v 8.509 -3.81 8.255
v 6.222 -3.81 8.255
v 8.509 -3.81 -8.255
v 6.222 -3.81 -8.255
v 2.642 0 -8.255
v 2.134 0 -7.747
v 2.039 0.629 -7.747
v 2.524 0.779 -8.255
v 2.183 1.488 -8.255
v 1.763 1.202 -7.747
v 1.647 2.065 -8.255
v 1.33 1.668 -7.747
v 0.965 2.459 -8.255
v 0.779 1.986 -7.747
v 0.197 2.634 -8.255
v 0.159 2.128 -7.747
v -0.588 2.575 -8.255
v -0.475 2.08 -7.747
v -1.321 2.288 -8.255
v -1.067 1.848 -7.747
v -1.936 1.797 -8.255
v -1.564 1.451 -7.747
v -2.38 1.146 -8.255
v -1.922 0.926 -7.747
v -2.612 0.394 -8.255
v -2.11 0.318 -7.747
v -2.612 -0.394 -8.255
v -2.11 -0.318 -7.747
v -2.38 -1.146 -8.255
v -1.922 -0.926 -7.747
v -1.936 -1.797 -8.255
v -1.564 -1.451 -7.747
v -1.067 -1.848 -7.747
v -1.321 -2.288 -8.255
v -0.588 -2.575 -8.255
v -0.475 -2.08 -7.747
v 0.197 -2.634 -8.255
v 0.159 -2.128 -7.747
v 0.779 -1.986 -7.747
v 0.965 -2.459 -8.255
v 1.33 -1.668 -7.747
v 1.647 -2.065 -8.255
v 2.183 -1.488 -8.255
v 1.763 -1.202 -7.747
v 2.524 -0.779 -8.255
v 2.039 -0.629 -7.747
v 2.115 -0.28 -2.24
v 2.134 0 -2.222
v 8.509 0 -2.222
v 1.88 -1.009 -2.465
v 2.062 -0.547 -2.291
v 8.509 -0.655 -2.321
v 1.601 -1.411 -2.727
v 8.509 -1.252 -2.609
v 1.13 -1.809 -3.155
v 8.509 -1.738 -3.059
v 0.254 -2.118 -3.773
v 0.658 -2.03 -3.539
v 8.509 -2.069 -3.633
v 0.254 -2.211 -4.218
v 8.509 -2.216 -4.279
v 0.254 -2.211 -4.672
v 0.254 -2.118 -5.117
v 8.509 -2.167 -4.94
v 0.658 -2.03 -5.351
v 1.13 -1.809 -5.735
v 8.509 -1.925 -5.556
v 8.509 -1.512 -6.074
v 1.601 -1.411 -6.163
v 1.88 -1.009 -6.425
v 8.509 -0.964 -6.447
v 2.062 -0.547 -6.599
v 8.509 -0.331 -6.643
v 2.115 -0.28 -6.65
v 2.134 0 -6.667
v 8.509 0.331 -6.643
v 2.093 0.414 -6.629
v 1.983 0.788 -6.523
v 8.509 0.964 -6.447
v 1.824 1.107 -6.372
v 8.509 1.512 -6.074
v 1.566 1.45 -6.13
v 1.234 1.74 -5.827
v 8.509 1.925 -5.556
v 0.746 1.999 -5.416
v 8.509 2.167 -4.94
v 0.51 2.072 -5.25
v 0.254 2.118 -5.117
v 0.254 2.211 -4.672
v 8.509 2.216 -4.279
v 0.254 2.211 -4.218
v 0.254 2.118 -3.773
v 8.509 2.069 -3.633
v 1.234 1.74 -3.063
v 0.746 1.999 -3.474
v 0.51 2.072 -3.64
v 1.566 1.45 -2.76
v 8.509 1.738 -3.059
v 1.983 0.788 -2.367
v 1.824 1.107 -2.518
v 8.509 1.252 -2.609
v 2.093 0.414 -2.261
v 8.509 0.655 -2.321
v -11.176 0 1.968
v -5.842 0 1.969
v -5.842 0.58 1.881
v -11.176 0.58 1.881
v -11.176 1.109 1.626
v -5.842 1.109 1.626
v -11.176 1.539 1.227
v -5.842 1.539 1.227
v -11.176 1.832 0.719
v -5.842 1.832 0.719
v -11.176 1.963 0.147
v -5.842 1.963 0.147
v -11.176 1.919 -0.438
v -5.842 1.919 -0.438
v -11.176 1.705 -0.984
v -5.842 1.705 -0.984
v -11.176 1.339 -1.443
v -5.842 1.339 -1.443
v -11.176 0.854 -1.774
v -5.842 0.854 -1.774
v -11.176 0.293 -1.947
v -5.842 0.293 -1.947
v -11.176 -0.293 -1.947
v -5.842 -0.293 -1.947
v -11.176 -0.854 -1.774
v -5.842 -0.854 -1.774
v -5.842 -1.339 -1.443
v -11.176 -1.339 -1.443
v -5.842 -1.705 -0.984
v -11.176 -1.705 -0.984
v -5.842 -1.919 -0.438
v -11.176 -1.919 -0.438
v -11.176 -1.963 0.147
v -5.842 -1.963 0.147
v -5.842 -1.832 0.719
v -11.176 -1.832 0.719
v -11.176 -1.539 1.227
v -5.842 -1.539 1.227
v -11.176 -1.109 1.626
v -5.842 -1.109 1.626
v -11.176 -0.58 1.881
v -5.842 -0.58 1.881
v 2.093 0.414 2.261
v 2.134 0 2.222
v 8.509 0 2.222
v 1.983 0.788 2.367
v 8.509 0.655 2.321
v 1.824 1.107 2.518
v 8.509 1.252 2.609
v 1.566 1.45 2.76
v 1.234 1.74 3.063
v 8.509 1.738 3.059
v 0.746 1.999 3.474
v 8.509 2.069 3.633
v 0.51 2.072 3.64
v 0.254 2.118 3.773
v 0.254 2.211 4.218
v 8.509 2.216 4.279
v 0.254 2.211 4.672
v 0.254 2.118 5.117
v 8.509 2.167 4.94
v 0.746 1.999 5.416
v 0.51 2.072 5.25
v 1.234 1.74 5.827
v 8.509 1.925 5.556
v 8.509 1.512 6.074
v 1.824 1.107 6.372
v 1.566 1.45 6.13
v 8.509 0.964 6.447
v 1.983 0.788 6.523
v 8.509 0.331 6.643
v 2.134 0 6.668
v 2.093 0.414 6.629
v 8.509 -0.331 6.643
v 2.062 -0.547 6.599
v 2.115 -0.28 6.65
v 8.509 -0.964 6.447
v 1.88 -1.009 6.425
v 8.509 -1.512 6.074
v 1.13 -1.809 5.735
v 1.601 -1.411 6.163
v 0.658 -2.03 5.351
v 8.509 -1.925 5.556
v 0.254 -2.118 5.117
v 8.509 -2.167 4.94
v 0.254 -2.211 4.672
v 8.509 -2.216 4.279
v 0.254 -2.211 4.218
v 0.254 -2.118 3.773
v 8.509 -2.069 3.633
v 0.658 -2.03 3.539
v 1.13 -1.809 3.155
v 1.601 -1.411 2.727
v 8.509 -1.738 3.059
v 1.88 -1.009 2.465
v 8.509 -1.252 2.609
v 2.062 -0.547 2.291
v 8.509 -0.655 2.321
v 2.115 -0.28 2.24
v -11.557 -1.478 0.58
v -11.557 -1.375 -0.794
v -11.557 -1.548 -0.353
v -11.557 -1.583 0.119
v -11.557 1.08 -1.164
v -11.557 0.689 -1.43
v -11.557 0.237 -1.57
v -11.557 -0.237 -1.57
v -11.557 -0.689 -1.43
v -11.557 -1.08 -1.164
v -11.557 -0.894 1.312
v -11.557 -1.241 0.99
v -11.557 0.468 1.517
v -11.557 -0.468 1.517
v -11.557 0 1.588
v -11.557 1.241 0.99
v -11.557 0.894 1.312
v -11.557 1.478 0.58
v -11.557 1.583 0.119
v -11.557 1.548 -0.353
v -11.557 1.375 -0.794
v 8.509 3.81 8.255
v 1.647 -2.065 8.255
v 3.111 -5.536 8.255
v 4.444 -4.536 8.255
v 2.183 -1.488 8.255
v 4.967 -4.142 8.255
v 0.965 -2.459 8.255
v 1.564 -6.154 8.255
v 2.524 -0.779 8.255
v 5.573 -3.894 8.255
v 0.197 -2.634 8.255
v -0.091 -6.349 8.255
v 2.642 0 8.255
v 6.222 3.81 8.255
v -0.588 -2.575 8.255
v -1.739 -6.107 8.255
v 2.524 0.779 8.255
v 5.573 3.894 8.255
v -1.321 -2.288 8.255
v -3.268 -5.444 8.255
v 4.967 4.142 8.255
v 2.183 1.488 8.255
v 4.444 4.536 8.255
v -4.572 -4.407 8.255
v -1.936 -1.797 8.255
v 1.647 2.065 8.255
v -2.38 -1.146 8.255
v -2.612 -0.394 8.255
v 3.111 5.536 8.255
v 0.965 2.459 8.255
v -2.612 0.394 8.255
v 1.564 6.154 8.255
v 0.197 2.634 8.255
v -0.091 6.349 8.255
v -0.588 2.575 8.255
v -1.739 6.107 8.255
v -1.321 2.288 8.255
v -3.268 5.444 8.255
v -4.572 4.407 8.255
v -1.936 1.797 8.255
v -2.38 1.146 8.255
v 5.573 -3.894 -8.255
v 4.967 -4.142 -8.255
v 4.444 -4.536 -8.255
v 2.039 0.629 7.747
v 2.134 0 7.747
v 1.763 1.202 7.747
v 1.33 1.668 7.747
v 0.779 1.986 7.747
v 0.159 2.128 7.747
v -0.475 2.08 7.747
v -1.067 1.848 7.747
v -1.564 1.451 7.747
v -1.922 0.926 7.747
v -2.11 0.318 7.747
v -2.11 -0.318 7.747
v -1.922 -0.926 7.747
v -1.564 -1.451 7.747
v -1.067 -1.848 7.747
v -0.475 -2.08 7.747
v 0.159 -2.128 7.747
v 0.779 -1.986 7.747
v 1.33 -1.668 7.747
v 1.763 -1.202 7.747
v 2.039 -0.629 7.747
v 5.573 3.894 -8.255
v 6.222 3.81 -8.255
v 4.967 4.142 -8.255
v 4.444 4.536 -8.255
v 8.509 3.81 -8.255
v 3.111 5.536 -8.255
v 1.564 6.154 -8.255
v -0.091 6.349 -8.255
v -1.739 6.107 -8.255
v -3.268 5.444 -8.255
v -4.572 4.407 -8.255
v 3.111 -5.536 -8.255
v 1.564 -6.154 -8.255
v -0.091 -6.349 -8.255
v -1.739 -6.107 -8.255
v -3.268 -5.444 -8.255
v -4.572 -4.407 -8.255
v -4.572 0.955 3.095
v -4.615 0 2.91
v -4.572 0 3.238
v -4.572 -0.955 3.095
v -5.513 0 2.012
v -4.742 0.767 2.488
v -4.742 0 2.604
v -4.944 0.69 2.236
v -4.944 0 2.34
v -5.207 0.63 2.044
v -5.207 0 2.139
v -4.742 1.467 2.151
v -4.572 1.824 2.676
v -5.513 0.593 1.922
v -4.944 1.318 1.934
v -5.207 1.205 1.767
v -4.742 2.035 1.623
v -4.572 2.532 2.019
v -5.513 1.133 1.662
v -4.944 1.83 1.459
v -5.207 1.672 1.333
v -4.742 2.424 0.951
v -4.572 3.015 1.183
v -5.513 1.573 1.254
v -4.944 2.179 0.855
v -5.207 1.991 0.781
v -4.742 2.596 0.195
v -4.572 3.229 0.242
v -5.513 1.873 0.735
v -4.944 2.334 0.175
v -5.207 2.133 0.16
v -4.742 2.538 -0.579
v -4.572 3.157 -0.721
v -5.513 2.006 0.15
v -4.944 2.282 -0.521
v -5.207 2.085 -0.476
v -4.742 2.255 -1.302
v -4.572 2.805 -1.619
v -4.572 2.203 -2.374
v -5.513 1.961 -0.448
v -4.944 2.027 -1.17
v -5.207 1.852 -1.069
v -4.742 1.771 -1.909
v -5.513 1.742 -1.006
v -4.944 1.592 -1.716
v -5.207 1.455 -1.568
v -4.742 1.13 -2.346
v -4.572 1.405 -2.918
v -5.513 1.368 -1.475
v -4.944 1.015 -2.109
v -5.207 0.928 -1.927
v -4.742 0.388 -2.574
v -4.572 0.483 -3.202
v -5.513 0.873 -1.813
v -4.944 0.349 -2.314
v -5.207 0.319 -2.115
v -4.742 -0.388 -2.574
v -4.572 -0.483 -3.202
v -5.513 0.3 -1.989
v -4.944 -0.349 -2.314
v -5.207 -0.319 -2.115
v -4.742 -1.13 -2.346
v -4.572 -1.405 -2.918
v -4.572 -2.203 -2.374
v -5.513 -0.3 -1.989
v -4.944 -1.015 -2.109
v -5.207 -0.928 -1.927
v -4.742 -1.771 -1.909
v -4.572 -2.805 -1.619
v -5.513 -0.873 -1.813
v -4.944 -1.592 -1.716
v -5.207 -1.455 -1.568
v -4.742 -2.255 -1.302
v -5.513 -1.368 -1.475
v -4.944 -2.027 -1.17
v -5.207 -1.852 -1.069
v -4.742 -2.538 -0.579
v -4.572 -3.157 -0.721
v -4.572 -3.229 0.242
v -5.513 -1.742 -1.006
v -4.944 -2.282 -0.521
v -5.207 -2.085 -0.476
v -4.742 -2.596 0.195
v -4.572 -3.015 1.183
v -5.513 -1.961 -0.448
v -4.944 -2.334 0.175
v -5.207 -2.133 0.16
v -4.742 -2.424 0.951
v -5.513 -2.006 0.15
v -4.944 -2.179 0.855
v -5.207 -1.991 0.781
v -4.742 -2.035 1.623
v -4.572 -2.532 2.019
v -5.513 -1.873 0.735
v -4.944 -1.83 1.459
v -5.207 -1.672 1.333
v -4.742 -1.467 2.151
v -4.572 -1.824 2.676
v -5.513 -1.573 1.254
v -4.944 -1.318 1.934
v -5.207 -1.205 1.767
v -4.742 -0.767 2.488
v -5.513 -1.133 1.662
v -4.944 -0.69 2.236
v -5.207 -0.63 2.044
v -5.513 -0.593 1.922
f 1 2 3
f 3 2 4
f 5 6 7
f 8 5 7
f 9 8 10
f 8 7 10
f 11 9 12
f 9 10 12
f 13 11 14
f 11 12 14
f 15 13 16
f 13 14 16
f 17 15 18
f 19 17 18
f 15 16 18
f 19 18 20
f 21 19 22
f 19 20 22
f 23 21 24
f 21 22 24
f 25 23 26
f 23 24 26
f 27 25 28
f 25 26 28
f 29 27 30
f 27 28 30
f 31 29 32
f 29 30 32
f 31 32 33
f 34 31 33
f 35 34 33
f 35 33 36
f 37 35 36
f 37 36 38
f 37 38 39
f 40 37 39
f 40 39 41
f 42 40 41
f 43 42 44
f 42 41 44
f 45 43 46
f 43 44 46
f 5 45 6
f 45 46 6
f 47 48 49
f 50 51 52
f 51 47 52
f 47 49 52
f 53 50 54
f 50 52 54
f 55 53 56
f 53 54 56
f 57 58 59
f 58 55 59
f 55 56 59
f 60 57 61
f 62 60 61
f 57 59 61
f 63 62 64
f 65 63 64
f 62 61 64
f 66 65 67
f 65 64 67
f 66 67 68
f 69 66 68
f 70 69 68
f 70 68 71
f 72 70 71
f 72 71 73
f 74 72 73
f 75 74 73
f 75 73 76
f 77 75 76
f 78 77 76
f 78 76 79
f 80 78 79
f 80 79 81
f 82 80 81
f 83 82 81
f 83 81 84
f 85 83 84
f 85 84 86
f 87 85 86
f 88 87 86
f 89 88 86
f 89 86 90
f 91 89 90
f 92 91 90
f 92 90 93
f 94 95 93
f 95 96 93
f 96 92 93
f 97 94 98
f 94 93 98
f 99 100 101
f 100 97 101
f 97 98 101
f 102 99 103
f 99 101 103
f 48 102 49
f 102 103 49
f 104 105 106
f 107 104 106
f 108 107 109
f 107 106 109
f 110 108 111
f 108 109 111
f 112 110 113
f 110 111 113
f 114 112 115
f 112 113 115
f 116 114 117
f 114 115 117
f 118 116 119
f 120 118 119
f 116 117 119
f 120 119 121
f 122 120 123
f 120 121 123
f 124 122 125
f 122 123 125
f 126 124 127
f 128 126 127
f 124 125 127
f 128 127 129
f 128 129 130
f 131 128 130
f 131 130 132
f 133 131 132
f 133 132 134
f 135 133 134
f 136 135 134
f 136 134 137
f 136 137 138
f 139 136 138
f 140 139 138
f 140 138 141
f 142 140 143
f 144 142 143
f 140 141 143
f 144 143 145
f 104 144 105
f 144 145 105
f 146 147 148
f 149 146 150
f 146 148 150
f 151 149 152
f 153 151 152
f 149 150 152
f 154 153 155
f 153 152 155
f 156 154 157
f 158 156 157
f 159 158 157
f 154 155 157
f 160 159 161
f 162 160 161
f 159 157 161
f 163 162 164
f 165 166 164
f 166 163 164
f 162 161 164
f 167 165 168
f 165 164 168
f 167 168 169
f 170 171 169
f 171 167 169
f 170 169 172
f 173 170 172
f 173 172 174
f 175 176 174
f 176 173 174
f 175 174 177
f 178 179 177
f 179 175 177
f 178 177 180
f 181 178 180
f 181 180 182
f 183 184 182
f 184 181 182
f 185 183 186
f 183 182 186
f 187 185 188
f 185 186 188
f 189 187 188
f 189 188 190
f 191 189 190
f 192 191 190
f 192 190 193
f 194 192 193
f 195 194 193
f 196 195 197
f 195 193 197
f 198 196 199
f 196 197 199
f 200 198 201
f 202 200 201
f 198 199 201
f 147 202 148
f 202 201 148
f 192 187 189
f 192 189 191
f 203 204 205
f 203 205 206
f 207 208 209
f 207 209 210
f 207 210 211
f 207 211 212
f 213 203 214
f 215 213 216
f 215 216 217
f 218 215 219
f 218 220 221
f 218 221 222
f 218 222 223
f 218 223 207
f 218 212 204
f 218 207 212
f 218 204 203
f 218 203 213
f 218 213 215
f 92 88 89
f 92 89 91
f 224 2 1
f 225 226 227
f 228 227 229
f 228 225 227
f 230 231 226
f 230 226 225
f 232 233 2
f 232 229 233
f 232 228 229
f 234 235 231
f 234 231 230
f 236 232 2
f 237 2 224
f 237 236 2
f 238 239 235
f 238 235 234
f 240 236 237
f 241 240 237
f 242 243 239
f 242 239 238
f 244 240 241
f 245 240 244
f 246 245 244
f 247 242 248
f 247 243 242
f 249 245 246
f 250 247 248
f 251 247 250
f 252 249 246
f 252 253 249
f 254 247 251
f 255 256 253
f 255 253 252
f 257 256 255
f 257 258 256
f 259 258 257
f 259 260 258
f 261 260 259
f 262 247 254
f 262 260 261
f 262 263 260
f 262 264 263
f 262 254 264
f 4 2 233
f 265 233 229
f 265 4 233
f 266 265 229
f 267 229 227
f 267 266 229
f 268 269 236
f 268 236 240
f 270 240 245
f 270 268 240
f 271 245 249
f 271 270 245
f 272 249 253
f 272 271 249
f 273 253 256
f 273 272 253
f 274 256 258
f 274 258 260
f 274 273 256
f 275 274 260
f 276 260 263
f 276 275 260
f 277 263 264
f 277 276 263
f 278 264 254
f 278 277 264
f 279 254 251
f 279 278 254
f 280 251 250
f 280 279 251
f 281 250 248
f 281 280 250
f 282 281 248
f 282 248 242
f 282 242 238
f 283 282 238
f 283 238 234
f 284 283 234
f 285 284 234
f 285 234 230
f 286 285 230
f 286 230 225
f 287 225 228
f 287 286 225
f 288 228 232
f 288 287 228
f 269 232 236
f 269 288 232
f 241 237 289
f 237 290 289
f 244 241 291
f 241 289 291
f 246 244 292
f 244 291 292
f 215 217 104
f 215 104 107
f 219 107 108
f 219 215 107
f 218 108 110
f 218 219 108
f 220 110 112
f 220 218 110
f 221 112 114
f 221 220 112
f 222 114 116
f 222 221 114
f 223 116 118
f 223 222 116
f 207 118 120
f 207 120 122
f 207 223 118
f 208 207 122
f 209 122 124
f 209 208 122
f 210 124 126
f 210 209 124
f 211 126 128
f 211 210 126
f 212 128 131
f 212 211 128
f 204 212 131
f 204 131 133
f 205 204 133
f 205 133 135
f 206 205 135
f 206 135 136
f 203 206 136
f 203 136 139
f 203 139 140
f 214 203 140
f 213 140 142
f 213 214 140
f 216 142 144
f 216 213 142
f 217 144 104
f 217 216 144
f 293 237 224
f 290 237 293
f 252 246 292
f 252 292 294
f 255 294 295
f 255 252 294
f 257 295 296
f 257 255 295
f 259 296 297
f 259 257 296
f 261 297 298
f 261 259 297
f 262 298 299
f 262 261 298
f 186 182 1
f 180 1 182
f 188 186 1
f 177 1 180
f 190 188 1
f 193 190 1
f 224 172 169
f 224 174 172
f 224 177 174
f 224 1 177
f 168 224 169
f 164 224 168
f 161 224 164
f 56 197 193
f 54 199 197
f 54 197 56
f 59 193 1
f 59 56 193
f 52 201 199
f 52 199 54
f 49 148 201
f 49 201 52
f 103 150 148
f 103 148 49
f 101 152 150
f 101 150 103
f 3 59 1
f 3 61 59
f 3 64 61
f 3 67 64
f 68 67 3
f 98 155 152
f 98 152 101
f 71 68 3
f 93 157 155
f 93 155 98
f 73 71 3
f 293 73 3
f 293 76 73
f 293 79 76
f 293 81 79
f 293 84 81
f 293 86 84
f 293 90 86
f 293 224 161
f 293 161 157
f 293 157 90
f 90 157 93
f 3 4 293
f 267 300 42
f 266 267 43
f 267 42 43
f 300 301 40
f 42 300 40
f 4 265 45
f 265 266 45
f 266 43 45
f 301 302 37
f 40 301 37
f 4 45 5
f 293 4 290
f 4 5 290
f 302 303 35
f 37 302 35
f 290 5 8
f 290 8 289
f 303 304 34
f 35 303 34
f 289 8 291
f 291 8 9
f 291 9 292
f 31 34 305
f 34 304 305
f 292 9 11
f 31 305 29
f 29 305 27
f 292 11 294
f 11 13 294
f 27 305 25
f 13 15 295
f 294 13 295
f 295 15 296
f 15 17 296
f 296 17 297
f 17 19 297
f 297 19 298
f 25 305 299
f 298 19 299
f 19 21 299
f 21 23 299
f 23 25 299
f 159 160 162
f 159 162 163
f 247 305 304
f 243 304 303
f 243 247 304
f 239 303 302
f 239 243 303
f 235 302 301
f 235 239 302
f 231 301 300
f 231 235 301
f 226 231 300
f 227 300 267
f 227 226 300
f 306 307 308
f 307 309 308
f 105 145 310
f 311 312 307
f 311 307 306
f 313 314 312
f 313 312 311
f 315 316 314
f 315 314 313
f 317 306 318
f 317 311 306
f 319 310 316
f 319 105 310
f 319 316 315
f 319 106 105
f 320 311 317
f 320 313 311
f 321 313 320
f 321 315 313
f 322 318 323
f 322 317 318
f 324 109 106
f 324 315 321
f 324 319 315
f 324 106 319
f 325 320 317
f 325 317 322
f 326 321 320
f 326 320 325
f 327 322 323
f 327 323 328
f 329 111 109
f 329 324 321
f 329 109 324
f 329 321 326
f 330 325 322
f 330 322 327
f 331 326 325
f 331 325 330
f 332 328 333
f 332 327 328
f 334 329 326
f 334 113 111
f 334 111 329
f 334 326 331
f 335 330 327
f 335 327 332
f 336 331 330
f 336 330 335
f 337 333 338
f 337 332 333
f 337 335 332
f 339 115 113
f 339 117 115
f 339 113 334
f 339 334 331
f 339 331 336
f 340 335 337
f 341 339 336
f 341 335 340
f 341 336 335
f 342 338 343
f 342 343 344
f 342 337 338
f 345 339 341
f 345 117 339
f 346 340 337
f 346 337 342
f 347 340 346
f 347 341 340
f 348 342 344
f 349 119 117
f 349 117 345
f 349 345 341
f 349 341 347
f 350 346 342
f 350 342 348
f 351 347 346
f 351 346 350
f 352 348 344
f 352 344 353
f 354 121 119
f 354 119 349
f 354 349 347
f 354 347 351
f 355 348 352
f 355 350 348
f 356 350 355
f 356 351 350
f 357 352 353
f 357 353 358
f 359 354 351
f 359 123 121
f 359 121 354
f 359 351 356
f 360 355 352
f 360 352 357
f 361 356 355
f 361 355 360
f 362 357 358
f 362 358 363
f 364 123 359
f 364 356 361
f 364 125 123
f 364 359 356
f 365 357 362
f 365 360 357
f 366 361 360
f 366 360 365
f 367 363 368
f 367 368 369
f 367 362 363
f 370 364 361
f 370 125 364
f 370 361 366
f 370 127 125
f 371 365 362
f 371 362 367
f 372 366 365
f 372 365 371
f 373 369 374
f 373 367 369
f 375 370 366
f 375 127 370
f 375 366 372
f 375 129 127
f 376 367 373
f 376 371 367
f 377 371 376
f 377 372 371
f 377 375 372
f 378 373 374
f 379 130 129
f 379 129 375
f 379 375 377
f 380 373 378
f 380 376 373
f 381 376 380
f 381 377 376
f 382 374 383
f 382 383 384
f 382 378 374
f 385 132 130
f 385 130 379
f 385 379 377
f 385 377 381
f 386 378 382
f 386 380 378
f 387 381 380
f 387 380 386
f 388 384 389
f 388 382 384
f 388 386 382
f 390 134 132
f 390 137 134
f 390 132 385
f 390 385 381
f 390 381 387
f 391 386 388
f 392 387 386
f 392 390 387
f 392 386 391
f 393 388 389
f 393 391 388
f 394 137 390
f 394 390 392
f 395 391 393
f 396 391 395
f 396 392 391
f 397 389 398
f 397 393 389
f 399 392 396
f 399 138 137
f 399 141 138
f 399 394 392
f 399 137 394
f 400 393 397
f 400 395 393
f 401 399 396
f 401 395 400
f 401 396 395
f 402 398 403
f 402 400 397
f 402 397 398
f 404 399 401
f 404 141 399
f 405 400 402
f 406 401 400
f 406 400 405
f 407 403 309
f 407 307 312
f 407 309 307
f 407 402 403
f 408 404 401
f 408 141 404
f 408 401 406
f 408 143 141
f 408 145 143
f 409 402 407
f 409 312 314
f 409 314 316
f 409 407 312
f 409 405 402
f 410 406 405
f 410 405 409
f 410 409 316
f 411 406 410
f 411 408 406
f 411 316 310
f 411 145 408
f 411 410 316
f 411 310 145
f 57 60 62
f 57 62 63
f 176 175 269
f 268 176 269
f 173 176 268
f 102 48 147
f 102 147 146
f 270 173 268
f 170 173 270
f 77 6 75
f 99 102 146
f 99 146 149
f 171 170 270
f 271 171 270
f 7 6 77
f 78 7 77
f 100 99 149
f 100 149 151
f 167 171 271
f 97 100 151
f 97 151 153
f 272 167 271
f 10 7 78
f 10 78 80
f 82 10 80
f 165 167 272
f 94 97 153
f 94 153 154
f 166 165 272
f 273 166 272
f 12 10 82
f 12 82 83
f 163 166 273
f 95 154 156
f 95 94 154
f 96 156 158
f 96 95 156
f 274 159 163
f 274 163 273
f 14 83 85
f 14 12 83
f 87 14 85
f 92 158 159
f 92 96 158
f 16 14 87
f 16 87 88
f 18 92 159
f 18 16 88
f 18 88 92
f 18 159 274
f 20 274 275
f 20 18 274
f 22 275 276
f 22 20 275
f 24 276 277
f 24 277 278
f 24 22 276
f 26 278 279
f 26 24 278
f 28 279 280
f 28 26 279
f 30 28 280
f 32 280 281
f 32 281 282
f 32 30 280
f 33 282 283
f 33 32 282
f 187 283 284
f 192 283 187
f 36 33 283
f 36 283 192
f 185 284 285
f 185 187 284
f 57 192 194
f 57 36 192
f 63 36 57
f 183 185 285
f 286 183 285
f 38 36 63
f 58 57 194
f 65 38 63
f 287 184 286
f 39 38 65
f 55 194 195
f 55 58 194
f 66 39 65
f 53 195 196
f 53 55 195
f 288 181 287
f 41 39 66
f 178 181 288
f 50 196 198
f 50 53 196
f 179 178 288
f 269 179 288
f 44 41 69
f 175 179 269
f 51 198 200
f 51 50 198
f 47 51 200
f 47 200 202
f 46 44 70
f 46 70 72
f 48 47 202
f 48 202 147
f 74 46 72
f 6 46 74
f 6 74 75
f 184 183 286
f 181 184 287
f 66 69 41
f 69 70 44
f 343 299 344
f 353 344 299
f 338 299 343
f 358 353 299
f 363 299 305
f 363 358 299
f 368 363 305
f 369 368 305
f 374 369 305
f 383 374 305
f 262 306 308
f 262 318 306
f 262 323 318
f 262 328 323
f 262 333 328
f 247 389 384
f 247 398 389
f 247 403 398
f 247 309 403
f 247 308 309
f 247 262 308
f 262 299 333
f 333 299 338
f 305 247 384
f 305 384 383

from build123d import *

# Parameters (mm, degrees)
SKETCH1_R           = 6.35
SKETCH1_R_2         = 2.1336
BOSS_EXTRUDE1_DEPTH = 8.255
CUT_EXTRUDE1_DEPTH  = 19.794283705
SKETCH4_R           = 1.9685
BOSS_EXTRUDE2_DEPTH = 6.985
SKETCH6_W           = 16.51
SKETCH6_H           = 7.62
BOSS_EXTRUDE3_DEPTH = 3.429
FILLET1_R           = 1.27
CHAMFER1_SIZE       = 0.381
SKETCH5_R           = 2.2225
CUT_EXTRUDE2_DEPTH  = 8.255
CHAMFER2_SIZE       = 0.508
FILLET2_R           = 2.54


with BuildPart() as part:
    # Sketch1 → Boss-Extrude1 (new, symmetric)
    with BuildSketch(Plane.XY):
        Circle(SKETCH1_R)
        Circle(SKETCH1_R_2, mode=Mode.SUBTRACT)
    extrude(amount=BOSS_EXTRUDE1_DEPTH, both=True)

    # Sketch3 → Cut-Extrude1 (cut, through all)
    with BuildSketch(Plane.XY.offset(8.255)):
        with BuildLine():
            Line((-4.572, 4.4067353), (-4.572, -4.4067353))
            ThreePointArc((-4.572, -4.4067353), (-6.35, 0), (-4.572, 4.4067353))
        make_face()
        with BuildLine():
            Line((5.08, 3.81), (5.08, -3.81))
            ThreePointArc((5.08, -3.81), (6.35, 0), (5.08, 3.81))
        make_face()
    extrude(amount=-CUT_EXTRUDE1_DEPTH, mode=Mode.SUBTRACT)

    # Sketch4 → Boss-Extrude2 (add)
    with BuildSketch(Plane.ZY.offset(4.572)):
        Circle(SKETCH4_R)
    extrude(amount=BOSS_EXTRUDE2_DEPTH)

    # Sketch6 → Boss-Extrude3 (add)
    with BuildSketch(Plane(origin=(5.08, 0, 0), x_dir=(0, 0, -1), z_dir=(1, 0, 0))):
        Rectangle(SKETCH6_W, SKETCH6_H)
    extrude(amount=BOSS_EXTRUDE3_DEPTH)

    # Fillet1
    fillet1_edges = [part.edges().sort_by_distance(p)[0] for p in [
        (-4.572, 0, -1.9685),
    ]]
    fillet(fillet1_edges, radius=FILLET1_R)

    # Chamfer1
    chamfer1_edges = [part.edges().sort_by_distance(p)[0] for p in [
        (-11.557, 0, -1.9685),
    ]]
    chamfer(chamfer1_edges, length=CHAMFER1_SIZE)

    # Sketch5 → Cut-Extrude2 (cut)
    with BuildSketch(Plane(origin=(8.509, 0, 0), x_dir=(0, 0, -1), z_dir=(1, 0, 0))):
        with Locations((-4.445, 0)):
            Circle(SKETCH5_R)
        with Locations(Location((4.445, 0, 0), (0, 0, 180.000000003))):
            Circle(SKETCH5_R)
    extrude(amount=-CUT_EXTRUDE2_DEPTH, mode=Mode.SUBTRACT)

    # Chamfer2
    chamfer2_edges = [part.edges().sort_by_distance(p)[0] for p in [
        (-2.1336, 0, -8.255),
        (-2.1336, 0, 8.255),
    ]]
    chamfer(chamfer2_edges, length=CHAMFER2_SIZE)

    # Fillet2
    fillet2_edges = [part.edges().sort_by_distance(p)[0] for p in [
        (5.08, 3.81, 0),
        (5.08, -3.81, 0),
    ]]
    fillet(fillet2_edges, radius=FILLET2_R)


solid = part.part
